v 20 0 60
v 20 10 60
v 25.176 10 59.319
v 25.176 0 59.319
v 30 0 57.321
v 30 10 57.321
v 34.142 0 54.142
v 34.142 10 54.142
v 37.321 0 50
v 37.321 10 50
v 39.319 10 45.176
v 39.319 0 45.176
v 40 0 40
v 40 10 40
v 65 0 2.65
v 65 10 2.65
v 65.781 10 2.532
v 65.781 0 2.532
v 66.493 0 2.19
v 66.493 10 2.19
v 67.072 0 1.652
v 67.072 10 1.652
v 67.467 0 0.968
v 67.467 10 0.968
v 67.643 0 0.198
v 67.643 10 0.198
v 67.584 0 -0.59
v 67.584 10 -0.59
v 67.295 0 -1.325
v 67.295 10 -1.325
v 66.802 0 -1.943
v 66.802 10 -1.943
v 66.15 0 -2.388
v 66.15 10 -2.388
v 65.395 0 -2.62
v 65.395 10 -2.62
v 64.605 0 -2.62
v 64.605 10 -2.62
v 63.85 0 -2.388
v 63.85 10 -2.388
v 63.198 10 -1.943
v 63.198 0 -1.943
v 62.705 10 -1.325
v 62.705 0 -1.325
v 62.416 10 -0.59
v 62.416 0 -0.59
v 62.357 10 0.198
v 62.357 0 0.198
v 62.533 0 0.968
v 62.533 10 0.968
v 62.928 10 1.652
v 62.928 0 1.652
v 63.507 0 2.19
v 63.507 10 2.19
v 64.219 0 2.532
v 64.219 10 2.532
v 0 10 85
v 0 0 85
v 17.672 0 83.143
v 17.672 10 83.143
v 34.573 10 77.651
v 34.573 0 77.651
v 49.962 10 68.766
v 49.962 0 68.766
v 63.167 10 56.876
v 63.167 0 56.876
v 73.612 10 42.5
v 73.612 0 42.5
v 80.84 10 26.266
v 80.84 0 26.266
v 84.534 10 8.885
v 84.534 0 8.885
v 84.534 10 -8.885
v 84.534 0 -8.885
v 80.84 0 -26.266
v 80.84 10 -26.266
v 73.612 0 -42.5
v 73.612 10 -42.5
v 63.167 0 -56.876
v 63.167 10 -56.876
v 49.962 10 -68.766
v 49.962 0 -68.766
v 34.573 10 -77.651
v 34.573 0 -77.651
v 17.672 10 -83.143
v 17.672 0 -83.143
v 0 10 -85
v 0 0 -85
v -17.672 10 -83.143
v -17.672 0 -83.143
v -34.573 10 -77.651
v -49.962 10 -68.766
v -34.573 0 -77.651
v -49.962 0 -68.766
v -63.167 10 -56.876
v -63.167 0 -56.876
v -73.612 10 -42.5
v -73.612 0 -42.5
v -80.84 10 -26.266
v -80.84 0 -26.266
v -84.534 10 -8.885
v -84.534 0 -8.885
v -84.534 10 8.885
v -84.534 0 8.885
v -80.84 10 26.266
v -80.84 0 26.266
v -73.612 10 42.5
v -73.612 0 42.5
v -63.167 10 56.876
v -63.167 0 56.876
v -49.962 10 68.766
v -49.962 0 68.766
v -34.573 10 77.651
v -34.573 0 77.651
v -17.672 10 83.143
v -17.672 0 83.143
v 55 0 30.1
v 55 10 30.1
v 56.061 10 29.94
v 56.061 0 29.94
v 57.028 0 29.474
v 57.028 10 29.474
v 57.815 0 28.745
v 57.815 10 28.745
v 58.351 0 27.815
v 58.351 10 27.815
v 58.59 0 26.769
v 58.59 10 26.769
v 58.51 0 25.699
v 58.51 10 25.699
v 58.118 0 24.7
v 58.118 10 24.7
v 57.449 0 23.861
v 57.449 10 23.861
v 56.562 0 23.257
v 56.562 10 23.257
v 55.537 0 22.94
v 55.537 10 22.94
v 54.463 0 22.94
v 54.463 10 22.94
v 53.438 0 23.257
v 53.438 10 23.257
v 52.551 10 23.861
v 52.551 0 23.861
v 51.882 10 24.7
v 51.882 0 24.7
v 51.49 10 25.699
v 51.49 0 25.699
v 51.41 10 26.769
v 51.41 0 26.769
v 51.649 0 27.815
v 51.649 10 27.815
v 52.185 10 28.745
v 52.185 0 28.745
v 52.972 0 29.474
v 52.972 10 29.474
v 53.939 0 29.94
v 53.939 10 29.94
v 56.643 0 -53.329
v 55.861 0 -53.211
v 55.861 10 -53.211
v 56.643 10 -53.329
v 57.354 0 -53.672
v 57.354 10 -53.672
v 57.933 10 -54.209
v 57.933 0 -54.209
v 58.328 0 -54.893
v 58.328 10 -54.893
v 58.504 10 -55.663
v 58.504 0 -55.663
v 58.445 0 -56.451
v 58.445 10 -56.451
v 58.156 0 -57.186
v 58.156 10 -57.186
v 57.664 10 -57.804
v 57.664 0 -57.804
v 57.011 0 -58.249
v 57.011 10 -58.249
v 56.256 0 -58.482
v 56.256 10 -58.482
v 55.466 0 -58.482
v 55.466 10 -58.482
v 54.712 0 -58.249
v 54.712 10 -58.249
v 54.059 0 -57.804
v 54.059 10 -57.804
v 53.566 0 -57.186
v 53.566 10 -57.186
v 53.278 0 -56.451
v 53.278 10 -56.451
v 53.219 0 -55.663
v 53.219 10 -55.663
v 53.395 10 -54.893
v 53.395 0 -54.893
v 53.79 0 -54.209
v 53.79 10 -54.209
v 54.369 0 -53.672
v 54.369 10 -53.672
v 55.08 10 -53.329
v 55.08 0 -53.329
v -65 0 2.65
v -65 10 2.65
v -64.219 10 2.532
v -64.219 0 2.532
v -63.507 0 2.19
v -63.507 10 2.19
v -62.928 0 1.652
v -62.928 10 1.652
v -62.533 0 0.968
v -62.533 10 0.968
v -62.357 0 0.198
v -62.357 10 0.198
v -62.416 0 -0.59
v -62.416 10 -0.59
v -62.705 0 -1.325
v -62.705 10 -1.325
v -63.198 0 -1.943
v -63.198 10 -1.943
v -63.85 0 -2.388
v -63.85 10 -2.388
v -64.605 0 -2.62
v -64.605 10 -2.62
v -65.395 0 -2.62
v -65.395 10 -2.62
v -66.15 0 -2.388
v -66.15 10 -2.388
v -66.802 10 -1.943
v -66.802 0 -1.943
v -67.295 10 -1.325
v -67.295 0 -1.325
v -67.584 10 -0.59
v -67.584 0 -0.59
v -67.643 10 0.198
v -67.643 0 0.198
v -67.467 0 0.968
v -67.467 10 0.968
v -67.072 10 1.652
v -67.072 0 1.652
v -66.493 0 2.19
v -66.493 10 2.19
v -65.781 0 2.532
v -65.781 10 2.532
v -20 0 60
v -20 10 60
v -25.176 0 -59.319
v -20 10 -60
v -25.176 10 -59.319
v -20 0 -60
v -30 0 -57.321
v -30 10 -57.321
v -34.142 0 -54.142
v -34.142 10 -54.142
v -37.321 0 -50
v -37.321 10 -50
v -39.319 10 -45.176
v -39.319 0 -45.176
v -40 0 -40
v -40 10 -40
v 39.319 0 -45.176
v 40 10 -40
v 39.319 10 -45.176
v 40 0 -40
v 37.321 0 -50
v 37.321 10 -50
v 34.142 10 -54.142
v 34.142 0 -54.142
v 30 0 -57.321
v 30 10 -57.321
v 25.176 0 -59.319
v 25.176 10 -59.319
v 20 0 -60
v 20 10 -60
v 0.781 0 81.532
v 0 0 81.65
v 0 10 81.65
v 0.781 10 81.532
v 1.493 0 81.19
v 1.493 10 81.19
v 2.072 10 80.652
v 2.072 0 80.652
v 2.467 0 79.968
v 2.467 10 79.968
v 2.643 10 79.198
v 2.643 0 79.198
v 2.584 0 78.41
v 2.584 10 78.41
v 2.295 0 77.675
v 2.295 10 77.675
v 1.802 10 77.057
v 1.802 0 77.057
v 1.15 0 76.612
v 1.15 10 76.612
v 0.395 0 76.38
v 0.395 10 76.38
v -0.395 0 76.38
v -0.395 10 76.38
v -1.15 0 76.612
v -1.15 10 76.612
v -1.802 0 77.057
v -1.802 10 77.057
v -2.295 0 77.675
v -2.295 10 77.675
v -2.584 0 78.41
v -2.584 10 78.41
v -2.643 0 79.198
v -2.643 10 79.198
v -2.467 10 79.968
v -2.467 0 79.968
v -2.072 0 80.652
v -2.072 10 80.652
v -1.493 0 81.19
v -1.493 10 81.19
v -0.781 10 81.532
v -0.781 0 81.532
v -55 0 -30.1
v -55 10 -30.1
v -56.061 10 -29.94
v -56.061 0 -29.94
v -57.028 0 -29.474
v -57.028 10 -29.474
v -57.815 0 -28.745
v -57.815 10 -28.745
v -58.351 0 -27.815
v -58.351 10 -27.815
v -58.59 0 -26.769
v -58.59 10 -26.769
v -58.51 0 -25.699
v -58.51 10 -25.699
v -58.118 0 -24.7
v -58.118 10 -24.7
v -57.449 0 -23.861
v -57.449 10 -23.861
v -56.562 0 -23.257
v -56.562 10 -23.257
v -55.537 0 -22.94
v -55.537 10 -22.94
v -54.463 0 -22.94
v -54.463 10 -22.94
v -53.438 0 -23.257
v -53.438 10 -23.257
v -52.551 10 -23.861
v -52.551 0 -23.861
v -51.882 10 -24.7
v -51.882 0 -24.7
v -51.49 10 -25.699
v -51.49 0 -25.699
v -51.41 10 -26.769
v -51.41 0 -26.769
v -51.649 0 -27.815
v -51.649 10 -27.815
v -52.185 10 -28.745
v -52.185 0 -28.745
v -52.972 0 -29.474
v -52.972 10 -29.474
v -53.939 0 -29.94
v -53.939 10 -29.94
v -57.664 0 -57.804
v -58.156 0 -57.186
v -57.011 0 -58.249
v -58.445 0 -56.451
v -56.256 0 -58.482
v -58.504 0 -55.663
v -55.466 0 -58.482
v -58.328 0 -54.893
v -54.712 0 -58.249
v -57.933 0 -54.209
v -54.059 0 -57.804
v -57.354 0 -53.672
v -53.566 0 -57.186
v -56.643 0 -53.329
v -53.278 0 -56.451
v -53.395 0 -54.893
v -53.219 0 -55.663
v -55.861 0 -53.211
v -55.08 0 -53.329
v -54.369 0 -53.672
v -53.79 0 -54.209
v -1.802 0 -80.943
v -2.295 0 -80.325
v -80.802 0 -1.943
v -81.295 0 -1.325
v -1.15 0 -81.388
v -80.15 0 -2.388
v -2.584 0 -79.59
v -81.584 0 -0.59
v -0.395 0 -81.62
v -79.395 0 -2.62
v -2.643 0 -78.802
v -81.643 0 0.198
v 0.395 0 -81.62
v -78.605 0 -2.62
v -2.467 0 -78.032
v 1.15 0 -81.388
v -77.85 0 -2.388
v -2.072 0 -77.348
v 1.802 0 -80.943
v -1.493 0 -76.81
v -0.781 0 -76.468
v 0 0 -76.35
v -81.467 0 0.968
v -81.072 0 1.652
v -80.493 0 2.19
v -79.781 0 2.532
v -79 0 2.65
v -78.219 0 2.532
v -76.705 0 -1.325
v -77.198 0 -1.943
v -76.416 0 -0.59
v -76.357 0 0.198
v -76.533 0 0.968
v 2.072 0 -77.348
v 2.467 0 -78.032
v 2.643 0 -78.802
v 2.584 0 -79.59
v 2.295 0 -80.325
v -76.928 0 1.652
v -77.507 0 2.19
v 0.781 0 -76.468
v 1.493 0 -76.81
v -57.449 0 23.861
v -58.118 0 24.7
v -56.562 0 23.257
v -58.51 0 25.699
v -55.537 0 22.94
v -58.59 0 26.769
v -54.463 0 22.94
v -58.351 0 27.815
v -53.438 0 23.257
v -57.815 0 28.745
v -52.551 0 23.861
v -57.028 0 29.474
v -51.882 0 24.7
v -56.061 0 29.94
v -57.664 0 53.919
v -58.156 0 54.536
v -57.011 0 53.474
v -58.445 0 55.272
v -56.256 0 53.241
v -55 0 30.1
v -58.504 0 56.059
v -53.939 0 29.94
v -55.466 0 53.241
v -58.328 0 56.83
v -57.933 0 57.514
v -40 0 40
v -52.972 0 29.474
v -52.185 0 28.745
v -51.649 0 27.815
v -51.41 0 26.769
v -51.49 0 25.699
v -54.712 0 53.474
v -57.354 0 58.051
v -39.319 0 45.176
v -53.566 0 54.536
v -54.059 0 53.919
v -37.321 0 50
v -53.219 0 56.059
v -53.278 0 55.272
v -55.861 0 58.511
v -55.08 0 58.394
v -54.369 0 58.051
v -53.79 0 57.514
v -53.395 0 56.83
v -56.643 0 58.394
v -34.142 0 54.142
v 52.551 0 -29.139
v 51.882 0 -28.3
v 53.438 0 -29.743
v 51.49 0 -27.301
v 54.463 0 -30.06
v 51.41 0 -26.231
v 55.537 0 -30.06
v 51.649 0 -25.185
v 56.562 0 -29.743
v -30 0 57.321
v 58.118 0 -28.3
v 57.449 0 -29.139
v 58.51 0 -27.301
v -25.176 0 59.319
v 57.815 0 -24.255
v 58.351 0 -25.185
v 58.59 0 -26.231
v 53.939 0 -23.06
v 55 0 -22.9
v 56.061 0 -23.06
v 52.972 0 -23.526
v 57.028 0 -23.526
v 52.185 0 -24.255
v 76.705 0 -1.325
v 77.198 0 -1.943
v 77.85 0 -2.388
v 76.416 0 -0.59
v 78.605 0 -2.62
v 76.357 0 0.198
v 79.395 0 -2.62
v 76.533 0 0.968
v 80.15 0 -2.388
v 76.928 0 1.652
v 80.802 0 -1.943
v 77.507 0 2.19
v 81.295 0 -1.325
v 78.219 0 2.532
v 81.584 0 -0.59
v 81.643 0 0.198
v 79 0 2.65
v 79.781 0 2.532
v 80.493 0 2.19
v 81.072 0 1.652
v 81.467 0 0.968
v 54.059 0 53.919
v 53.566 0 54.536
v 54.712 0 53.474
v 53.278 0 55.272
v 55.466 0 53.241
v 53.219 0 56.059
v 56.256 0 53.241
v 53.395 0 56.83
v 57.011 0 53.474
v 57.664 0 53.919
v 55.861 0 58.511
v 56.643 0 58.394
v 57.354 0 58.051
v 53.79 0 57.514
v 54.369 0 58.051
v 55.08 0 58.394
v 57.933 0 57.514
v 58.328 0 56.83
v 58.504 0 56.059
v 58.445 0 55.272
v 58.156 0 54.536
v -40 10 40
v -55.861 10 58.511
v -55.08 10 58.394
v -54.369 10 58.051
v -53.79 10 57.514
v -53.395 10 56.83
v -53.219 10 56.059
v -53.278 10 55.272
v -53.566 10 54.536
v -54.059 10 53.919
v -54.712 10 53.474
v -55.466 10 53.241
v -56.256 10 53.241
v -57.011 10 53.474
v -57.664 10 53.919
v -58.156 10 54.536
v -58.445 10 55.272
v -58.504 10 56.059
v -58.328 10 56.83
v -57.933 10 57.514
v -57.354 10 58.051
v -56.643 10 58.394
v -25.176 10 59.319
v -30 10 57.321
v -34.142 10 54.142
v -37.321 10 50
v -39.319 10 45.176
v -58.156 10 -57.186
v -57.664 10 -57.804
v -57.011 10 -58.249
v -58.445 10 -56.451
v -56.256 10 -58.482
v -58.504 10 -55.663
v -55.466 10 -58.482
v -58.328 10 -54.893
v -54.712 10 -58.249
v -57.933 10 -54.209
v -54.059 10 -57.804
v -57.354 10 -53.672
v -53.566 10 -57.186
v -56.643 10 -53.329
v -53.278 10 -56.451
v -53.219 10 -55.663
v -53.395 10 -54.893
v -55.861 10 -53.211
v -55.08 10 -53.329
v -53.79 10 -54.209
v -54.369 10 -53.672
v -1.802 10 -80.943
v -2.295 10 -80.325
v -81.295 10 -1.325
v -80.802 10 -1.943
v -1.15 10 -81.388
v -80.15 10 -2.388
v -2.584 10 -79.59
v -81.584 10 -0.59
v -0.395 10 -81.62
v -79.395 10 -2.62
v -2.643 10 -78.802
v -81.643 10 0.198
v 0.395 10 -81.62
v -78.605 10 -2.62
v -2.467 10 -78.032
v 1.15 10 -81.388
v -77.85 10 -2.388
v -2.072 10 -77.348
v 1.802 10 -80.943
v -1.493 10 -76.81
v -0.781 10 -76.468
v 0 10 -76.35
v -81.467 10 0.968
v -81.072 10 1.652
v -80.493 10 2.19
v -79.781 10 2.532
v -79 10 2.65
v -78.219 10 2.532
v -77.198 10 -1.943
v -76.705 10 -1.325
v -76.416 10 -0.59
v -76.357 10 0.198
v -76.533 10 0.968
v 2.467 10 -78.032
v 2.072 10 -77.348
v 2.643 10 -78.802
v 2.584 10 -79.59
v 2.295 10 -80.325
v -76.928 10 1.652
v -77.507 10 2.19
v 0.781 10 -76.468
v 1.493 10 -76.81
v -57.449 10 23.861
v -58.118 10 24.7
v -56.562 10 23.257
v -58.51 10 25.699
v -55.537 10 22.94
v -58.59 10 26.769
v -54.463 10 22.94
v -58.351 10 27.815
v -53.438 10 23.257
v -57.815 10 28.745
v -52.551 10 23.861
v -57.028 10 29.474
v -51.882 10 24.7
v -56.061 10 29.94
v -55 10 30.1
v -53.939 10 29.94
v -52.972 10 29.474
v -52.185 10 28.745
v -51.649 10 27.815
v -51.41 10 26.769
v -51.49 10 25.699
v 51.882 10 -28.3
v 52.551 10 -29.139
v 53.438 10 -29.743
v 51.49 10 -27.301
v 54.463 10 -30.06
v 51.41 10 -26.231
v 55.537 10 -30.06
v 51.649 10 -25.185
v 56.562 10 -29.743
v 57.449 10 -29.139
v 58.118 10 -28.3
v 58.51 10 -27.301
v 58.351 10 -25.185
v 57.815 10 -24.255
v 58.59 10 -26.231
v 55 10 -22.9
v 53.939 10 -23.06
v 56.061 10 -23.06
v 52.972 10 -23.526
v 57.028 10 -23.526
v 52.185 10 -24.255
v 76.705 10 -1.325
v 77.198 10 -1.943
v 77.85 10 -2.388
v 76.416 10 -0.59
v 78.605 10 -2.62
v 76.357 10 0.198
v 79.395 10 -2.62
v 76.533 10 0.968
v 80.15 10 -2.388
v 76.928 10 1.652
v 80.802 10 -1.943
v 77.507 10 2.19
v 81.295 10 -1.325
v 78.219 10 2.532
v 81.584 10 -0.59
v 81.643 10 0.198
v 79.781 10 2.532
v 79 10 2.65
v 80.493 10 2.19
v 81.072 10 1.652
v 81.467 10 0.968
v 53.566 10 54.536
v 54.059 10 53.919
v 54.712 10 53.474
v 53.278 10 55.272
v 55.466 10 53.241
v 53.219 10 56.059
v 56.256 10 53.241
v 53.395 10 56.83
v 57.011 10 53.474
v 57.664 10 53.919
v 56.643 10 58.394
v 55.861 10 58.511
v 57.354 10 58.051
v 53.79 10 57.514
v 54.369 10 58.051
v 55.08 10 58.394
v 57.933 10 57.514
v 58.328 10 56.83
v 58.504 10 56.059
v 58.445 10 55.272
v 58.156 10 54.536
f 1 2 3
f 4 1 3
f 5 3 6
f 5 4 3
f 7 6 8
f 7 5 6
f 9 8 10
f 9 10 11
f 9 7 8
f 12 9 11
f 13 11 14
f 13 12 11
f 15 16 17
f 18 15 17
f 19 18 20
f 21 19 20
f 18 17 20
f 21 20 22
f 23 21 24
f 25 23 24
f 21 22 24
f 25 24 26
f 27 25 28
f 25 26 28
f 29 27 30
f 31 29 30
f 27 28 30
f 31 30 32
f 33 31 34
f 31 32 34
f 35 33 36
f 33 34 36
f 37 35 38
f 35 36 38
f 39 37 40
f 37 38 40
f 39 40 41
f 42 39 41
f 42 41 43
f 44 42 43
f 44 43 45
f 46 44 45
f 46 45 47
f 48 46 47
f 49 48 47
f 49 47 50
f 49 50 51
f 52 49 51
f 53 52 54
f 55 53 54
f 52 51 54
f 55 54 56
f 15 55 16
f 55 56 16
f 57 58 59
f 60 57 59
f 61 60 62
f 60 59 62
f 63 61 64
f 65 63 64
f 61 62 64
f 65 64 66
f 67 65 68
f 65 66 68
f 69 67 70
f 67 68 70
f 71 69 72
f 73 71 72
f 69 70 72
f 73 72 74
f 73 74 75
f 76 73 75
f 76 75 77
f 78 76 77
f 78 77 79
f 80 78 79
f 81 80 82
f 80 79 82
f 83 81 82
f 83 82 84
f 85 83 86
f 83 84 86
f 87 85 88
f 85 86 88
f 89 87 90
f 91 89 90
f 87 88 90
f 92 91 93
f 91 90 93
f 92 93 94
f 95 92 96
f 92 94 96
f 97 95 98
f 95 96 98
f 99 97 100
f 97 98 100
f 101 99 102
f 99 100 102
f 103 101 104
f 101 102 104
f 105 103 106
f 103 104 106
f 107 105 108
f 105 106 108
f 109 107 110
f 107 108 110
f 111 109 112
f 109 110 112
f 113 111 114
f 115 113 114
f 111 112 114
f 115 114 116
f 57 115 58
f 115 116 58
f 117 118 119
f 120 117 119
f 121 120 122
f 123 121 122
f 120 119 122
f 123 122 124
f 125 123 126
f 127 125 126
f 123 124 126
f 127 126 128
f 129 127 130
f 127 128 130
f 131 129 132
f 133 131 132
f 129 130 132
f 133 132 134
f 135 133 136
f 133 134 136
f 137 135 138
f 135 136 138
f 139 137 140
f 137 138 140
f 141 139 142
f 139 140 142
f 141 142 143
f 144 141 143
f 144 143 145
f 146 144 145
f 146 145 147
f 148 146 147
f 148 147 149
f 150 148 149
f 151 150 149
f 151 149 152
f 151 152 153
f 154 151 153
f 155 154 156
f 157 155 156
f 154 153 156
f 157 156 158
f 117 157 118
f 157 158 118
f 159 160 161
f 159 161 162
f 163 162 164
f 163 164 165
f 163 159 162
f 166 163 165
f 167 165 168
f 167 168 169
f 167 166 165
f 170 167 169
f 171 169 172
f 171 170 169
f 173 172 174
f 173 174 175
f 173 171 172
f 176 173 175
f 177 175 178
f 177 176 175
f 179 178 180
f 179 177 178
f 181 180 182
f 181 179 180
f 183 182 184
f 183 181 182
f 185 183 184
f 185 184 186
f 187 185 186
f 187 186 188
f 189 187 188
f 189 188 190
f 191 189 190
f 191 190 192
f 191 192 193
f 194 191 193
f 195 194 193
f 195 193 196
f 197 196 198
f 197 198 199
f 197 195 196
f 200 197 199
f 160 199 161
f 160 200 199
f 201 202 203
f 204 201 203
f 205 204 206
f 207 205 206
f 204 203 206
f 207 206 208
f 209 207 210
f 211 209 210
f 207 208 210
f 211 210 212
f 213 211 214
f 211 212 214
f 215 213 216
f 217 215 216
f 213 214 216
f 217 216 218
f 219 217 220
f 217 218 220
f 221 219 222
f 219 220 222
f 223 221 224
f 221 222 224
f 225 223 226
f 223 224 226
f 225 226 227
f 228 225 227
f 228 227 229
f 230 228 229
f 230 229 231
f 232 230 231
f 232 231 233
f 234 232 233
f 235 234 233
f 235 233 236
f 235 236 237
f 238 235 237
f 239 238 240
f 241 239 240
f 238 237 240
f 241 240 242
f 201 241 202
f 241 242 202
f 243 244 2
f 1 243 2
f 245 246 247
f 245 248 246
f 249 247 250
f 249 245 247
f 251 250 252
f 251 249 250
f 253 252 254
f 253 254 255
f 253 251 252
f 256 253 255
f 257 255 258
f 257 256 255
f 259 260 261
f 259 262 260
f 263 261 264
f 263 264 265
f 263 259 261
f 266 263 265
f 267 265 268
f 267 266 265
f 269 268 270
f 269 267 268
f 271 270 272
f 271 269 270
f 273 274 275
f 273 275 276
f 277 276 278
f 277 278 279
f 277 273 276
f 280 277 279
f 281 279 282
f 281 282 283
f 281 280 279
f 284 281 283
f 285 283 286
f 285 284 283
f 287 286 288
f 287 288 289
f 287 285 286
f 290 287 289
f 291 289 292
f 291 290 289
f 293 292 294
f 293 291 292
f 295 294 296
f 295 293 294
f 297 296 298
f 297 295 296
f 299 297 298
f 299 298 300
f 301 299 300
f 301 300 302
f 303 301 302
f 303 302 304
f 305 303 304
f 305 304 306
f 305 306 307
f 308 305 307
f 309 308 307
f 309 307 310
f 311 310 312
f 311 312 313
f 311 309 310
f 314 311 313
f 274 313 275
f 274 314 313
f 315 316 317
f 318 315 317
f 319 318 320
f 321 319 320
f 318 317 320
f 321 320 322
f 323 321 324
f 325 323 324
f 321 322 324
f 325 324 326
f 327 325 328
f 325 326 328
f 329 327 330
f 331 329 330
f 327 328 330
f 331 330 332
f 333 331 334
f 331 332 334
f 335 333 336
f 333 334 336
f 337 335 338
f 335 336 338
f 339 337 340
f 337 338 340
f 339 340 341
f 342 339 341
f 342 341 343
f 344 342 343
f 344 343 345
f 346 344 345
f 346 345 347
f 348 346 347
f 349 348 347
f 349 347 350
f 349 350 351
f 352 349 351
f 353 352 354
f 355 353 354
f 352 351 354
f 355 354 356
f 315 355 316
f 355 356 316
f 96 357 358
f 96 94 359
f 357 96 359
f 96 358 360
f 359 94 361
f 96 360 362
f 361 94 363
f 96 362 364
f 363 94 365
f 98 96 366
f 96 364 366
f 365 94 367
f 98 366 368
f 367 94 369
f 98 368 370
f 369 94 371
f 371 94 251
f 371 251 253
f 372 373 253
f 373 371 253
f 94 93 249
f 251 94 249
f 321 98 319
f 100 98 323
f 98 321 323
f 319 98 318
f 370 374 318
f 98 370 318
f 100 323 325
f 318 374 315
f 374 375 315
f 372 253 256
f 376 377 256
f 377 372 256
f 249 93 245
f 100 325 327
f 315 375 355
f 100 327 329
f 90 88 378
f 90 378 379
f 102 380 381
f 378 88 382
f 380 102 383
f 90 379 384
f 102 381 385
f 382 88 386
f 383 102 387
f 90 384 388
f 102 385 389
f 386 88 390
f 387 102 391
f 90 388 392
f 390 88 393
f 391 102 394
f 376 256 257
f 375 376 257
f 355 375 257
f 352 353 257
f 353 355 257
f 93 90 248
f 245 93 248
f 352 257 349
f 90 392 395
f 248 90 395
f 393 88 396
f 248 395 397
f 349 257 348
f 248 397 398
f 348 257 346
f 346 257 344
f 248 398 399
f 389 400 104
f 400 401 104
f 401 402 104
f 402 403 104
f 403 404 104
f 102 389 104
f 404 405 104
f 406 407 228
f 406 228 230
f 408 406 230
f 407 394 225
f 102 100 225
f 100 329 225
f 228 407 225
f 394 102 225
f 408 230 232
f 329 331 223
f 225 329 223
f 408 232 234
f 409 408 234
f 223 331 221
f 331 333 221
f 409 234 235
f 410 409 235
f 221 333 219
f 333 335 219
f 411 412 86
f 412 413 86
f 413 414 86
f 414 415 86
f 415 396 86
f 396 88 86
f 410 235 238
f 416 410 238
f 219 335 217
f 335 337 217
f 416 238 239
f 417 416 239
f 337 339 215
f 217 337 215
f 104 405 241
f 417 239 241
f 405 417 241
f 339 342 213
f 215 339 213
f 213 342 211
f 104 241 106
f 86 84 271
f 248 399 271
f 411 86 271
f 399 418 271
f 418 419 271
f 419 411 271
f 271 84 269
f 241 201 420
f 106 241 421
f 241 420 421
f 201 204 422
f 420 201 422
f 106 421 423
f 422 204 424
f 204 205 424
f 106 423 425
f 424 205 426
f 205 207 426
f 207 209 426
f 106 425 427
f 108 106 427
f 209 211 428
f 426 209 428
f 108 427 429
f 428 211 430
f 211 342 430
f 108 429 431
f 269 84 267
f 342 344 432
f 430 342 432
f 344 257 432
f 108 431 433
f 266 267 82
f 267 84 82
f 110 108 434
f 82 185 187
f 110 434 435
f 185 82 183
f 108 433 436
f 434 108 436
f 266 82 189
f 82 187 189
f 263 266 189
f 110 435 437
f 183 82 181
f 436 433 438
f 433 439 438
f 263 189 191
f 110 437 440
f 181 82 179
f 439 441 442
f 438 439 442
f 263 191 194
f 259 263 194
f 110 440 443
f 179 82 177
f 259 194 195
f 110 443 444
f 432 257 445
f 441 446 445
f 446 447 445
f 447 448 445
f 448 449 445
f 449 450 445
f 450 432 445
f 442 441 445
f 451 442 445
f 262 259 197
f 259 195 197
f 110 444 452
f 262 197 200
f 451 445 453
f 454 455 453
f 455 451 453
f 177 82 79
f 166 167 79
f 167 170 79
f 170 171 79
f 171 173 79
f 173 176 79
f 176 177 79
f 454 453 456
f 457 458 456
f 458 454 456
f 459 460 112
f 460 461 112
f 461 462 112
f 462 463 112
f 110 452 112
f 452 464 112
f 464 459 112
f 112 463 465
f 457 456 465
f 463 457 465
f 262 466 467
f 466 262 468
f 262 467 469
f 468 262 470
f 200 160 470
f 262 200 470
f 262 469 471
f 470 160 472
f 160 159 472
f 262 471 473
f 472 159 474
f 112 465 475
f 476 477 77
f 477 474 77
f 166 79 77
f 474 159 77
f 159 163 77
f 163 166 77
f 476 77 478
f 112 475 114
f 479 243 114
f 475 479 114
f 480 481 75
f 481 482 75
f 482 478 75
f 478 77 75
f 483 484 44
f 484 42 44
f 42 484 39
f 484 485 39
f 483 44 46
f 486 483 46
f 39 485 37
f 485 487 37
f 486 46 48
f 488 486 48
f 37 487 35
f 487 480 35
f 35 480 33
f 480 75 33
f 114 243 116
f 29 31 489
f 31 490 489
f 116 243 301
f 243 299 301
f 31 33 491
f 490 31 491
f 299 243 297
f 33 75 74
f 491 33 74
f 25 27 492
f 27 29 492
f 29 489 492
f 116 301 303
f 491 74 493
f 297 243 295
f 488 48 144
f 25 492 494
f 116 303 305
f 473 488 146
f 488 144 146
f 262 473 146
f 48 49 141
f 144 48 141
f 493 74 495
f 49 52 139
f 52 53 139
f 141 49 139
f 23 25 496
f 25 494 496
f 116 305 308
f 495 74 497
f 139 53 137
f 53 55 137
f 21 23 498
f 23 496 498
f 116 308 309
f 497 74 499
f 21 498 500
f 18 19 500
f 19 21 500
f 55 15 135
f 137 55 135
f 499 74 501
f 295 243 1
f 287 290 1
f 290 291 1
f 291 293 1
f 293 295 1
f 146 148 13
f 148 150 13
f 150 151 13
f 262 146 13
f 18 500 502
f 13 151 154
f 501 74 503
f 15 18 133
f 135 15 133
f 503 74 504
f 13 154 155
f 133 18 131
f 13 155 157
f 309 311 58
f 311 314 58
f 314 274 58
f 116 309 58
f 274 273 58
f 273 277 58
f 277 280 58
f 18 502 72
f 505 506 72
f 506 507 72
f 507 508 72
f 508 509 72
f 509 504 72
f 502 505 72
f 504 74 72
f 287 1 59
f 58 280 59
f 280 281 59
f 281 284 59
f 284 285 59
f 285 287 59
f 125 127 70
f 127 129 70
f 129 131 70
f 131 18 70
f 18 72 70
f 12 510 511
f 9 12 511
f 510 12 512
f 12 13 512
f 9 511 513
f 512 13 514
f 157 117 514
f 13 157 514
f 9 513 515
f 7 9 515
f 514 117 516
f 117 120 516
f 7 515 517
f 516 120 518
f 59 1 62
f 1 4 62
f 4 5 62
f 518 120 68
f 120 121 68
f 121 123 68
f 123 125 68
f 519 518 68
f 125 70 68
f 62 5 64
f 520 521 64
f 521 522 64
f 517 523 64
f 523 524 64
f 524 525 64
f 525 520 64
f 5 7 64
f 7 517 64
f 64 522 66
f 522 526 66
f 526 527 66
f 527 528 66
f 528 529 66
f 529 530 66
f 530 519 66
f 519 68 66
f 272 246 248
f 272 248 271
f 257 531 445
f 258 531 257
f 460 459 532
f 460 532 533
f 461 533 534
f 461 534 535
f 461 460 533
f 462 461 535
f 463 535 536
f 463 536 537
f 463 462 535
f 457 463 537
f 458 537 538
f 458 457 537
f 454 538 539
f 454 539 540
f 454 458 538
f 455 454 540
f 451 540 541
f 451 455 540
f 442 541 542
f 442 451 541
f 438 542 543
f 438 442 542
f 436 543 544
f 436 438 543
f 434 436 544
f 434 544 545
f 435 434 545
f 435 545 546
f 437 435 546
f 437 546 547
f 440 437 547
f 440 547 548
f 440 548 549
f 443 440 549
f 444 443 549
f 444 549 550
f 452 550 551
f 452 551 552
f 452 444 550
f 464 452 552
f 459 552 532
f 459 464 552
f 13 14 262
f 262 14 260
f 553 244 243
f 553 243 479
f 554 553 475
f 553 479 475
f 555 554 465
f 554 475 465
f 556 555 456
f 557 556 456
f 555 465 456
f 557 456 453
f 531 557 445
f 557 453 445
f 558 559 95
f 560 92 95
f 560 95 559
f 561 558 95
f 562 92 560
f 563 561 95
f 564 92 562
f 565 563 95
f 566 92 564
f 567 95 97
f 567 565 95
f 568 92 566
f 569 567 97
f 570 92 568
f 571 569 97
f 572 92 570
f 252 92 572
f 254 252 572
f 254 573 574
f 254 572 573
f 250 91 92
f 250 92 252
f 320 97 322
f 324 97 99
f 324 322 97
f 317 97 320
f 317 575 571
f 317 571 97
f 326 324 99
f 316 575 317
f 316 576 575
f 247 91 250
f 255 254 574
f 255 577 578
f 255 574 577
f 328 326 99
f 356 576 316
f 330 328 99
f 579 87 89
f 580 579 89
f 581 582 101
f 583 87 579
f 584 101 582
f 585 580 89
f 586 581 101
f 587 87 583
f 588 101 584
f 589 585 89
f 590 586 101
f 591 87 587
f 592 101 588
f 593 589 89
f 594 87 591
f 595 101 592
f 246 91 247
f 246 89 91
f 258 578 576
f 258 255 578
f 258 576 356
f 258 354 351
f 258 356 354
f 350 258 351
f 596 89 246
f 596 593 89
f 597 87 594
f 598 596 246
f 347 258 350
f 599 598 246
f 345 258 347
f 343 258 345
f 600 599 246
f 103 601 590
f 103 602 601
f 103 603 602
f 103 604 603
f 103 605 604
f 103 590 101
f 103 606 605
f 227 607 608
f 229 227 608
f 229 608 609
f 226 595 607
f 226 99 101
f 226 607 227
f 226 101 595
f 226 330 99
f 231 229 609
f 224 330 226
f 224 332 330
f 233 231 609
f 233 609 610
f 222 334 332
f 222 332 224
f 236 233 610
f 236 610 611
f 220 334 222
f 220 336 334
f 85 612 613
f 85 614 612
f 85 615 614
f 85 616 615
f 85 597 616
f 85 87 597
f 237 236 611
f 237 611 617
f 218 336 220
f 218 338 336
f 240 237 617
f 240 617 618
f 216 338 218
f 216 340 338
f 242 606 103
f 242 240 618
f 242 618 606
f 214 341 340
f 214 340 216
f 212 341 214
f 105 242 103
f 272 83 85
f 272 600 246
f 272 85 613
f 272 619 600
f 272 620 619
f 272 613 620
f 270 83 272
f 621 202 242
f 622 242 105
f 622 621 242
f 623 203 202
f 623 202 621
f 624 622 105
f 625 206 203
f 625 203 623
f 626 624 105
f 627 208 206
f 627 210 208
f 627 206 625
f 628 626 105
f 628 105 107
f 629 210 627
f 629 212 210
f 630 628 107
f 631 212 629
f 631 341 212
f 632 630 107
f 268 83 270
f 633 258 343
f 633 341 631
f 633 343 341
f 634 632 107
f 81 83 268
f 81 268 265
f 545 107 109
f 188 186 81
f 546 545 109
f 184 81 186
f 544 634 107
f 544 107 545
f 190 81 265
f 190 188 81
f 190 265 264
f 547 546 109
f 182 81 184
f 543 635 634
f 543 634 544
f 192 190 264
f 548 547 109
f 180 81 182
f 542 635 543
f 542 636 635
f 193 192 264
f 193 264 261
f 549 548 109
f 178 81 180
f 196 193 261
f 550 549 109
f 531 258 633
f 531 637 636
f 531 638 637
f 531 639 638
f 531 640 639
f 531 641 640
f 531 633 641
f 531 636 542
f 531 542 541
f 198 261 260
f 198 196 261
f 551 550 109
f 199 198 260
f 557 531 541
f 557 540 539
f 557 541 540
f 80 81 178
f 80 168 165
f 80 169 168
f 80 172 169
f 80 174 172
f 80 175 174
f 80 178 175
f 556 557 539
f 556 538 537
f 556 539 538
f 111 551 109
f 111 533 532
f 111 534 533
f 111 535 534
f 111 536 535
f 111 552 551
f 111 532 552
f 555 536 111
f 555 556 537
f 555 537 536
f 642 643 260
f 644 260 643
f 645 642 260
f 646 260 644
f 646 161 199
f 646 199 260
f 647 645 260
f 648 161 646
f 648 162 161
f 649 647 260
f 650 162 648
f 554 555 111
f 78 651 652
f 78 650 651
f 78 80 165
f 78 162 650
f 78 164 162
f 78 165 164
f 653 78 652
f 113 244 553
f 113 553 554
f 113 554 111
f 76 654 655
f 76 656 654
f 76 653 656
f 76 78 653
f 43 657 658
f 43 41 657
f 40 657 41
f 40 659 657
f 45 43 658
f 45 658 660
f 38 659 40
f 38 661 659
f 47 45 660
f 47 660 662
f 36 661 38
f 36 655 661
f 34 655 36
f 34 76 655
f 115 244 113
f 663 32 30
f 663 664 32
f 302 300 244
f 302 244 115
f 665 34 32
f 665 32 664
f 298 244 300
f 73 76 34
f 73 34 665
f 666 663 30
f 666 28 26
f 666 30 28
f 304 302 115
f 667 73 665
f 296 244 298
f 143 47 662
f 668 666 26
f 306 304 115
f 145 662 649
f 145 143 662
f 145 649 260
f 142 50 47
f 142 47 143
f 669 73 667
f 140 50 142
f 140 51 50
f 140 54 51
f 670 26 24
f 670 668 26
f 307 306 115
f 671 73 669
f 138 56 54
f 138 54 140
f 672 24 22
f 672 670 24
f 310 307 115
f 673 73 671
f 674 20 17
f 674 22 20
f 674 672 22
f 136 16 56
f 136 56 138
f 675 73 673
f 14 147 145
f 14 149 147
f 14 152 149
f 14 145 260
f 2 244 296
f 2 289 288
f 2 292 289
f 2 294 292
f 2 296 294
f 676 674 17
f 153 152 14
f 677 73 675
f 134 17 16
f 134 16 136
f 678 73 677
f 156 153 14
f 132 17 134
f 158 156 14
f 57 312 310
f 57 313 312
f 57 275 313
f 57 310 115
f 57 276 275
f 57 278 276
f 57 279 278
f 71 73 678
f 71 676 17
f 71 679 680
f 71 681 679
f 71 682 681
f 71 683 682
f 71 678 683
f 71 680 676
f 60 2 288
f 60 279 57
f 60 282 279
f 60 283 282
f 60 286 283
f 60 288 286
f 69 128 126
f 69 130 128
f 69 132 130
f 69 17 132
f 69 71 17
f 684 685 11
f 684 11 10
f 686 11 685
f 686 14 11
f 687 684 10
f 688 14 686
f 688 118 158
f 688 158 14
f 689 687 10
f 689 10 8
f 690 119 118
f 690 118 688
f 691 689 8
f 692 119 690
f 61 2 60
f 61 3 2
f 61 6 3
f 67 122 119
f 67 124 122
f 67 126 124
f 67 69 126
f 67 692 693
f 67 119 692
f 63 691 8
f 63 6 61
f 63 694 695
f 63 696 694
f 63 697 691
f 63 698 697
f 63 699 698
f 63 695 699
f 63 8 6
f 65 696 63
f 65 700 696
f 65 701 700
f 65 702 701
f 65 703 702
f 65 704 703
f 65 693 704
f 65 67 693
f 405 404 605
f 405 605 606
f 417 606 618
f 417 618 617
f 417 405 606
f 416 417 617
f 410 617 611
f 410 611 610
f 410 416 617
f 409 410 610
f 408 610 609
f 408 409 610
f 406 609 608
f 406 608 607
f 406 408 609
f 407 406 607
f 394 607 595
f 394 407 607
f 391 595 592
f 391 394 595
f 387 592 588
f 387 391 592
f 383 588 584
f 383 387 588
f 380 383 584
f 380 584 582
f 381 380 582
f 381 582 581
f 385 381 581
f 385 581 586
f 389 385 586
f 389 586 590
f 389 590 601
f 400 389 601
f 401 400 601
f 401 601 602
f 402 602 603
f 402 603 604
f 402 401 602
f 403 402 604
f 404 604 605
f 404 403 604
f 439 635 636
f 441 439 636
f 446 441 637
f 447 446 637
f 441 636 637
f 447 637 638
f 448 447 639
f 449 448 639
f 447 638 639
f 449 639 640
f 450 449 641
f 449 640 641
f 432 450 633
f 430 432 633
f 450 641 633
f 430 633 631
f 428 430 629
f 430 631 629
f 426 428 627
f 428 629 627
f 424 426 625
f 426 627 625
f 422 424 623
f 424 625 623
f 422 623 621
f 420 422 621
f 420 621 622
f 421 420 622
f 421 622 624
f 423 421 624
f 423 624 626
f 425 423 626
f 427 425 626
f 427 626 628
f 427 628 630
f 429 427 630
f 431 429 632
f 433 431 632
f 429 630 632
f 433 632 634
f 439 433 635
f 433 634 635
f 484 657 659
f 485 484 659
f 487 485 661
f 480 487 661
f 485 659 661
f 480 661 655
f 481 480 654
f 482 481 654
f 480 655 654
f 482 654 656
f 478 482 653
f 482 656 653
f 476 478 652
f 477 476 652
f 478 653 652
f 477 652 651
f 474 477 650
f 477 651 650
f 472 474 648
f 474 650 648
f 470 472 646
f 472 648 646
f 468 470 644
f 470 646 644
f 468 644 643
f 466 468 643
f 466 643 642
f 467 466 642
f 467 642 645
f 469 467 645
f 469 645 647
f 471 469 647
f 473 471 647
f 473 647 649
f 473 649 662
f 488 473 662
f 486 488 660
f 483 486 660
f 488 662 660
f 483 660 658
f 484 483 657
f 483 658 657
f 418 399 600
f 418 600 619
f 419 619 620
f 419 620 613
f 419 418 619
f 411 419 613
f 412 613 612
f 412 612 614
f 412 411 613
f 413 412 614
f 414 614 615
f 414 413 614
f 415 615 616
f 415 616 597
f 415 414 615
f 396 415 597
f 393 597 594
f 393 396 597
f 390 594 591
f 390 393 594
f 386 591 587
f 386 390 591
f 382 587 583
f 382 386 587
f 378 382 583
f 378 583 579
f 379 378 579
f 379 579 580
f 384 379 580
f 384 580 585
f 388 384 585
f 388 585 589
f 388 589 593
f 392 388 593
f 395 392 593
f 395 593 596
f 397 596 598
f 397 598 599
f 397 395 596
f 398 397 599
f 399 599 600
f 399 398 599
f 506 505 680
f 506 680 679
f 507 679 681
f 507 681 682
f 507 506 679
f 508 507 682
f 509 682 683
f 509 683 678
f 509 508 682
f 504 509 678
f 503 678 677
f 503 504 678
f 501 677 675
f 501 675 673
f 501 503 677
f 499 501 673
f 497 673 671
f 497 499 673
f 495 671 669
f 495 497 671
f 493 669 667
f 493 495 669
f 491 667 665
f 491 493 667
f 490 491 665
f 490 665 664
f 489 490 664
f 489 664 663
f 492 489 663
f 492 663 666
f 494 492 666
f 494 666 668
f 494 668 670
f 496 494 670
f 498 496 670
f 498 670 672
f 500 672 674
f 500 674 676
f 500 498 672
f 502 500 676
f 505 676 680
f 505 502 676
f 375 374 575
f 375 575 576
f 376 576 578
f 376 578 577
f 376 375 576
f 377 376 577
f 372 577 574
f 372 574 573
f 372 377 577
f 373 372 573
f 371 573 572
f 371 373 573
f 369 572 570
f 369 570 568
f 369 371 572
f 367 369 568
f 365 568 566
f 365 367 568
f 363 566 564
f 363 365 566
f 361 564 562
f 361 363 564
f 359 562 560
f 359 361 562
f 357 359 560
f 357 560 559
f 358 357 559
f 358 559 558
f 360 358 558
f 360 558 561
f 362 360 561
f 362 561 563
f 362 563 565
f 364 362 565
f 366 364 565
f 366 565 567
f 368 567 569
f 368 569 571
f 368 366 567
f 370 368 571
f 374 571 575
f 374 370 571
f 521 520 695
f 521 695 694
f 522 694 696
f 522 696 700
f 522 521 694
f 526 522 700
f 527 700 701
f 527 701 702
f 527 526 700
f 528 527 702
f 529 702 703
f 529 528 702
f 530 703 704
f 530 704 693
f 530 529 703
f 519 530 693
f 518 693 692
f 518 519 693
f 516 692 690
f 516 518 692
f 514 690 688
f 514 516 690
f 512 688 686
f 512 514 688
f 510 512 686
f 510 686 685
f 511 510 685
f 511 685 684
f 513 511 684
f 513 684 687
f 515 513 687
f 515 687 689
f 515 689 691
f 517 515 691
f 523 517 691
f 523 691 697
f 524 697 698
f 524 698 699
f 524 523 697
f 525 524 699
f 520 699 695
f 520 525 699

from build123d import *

# Parameters (mm, degrees)
SKETCH_1_R          = 85.5
SKETCH_1_R_2        = 2.65
SKETCH_1_W          = 80
SKETCH_1_H          = 100
EXTRUDE_3_DEPTH     = 10
SKETCH_10_R         = 3.6
SKETCH_10_R_2       = 2.65
CUT_EXTRUDE_2_DEPTH = 10
SKETCH_11_W         = 80
SKETCH_11_H         = 120
CUT_EXTRUDE_3_DEPTH = 10
FILLET_1_R          = 20
CUT_EXTRUDE_START   = -10
SKETCH_12_R         = 85.5
SKETCH_12_R_2       = 85
CUT_EXTRUDE_4_DEPTH = 10


with BuildPart() as part:
    # 草图1 → 凸台-拉伸3 (new body)
    with BuildSketch(Plane(origin=(0, 0, 0), x_dir=(1, 0, 0), z_dir=(0, 1, 0))):
        with Locations(Location((0, 0, 0), (0, 0, 270))):
            Circle(SKETCH_1_R)
        with Locations(Location((0, 79, 0), (0, 0, 270))):
            Circle(SKETCH_1_R_2, mode=Mode.SUBTRACT)
        with Locations(Location((55.861435714, 55.861435714, 0), (0, 0, 270))):
            Circle(SKETCH_1_R_2, mode=Mode.SUBTRACT)
        with Locations(Location((79, 0, 0), (0, 0, 270))):
            Circle(SKETCH_1_R_2, mode=Mode.SUBTRACT)
        with Locations(Location((55.861435714, -55.861435714, 0), (0, 0, 270))):
            Circle(SKETCH_1_R_2, mode=Mode.SUBTRACT)
        with Locations(Location((0, -79, 0), (0, 0, 270))):
            Circle(SKETCH_1_R_2, mode=Mode.SUBTRACT)
        with Locations(Location((-55.861435714, -55.861435714, 0), (0, 0, 270))):
            Circle(SKETCH_1_R_2, mode=Mode.SUBTRACT)
        with Locations(Location((-79, 0, 0), (0, 0, 270))):
            Circle(SKETCH_1_R_2, mode=Mode.SUBTRACT)
        with Locations(Location((-55.861435714, 55.861435714, 0), (0, 0, 270))):
            Circle(SKETCH_1_R_2, mode=Mode.SUBTRACT)
        Rectangle(SKETCH_1_W, SKETCH_1_H, mode=Mode.SUBTRACT)
    extrude(amount=EXTRUDE_3_DEPTH)

    # 草图10 → 切除-拉伸2 (cut)
    with BuildSketch(Plane(origin=(0, 10, 0), x_dir=(1, 0, 0), z_dir=(0, 1, 0))):
        with Locations(Location((55, 26.5, 0), (0, 0, 270))):
            Circle(SKETCH_10_R)
        with Locations(Location((65, 0, 0), (0, 0, 270))):
            Circle(SKETCH_10_R_2)
        with Locations(Location((55, -26.5, 0), (0, 0, 270))):
            Circle(SKETCH_10_R)
        with Locations(Location((-55, -26.5, 0), (0, 0, 270))):
            Circle(SKETCH_10_R)
        with Locations(Location((-55, 26.5, 0), (0, 0, 90))):
            Circle(SKETCH_10_R)
        with Locations(Location((-65, 0, 0), (0, 0, 270))):
            Circle(SKETCH_10_R_2)
    extrude(amount=-CUT_EXTRUDE_2_DEPTH, mode=Mode.SUBTRACT)

    # 草图11 → 切除-拉伸3 (cut)
    with BuildSketch(Plane(origin=(0, 10, 0), x_dir=(1, 0, 0), z_dir=(0, 1, 0))):
        Rectangle(SKETCH_11_W, SKETCH_11_H)
    extrude(amount=-CUT_EXTRUDE_3_DEPTH, mode=Mode.SUBTRACT)

    # 圆角1
    fillet_1_edges = [part.edges().sort_by_distance(p)[0] for p in [
        (40, 5, -60),
        (40, 5, 60),
        (-40, 5, 60),
        (-40, 5, -60),
    ]]
    fillet(fillet_1_edges, radius=FILLET_1_R)

    # 草图12 → 切除-拉伸4 (cut)
    with BuildSketch(Plane(origin=(0, 10, 0), x_dir=(1, 0, 0), z_dir=(0, 1, 0)).offset(CUT_EXTRUDE_START)):
        Circle(SKETCH_12_R)
        with Locations(Location((0, 0, 0), (0, 0, 270))):
            Circle(SKETCH_12_R_2, mode=Mode.SUBTRACT)
    extrude(amount=CUT_EXTRUDE_4_DEPTH, mode=Mode.SUBTRACT)


solid = part.part
